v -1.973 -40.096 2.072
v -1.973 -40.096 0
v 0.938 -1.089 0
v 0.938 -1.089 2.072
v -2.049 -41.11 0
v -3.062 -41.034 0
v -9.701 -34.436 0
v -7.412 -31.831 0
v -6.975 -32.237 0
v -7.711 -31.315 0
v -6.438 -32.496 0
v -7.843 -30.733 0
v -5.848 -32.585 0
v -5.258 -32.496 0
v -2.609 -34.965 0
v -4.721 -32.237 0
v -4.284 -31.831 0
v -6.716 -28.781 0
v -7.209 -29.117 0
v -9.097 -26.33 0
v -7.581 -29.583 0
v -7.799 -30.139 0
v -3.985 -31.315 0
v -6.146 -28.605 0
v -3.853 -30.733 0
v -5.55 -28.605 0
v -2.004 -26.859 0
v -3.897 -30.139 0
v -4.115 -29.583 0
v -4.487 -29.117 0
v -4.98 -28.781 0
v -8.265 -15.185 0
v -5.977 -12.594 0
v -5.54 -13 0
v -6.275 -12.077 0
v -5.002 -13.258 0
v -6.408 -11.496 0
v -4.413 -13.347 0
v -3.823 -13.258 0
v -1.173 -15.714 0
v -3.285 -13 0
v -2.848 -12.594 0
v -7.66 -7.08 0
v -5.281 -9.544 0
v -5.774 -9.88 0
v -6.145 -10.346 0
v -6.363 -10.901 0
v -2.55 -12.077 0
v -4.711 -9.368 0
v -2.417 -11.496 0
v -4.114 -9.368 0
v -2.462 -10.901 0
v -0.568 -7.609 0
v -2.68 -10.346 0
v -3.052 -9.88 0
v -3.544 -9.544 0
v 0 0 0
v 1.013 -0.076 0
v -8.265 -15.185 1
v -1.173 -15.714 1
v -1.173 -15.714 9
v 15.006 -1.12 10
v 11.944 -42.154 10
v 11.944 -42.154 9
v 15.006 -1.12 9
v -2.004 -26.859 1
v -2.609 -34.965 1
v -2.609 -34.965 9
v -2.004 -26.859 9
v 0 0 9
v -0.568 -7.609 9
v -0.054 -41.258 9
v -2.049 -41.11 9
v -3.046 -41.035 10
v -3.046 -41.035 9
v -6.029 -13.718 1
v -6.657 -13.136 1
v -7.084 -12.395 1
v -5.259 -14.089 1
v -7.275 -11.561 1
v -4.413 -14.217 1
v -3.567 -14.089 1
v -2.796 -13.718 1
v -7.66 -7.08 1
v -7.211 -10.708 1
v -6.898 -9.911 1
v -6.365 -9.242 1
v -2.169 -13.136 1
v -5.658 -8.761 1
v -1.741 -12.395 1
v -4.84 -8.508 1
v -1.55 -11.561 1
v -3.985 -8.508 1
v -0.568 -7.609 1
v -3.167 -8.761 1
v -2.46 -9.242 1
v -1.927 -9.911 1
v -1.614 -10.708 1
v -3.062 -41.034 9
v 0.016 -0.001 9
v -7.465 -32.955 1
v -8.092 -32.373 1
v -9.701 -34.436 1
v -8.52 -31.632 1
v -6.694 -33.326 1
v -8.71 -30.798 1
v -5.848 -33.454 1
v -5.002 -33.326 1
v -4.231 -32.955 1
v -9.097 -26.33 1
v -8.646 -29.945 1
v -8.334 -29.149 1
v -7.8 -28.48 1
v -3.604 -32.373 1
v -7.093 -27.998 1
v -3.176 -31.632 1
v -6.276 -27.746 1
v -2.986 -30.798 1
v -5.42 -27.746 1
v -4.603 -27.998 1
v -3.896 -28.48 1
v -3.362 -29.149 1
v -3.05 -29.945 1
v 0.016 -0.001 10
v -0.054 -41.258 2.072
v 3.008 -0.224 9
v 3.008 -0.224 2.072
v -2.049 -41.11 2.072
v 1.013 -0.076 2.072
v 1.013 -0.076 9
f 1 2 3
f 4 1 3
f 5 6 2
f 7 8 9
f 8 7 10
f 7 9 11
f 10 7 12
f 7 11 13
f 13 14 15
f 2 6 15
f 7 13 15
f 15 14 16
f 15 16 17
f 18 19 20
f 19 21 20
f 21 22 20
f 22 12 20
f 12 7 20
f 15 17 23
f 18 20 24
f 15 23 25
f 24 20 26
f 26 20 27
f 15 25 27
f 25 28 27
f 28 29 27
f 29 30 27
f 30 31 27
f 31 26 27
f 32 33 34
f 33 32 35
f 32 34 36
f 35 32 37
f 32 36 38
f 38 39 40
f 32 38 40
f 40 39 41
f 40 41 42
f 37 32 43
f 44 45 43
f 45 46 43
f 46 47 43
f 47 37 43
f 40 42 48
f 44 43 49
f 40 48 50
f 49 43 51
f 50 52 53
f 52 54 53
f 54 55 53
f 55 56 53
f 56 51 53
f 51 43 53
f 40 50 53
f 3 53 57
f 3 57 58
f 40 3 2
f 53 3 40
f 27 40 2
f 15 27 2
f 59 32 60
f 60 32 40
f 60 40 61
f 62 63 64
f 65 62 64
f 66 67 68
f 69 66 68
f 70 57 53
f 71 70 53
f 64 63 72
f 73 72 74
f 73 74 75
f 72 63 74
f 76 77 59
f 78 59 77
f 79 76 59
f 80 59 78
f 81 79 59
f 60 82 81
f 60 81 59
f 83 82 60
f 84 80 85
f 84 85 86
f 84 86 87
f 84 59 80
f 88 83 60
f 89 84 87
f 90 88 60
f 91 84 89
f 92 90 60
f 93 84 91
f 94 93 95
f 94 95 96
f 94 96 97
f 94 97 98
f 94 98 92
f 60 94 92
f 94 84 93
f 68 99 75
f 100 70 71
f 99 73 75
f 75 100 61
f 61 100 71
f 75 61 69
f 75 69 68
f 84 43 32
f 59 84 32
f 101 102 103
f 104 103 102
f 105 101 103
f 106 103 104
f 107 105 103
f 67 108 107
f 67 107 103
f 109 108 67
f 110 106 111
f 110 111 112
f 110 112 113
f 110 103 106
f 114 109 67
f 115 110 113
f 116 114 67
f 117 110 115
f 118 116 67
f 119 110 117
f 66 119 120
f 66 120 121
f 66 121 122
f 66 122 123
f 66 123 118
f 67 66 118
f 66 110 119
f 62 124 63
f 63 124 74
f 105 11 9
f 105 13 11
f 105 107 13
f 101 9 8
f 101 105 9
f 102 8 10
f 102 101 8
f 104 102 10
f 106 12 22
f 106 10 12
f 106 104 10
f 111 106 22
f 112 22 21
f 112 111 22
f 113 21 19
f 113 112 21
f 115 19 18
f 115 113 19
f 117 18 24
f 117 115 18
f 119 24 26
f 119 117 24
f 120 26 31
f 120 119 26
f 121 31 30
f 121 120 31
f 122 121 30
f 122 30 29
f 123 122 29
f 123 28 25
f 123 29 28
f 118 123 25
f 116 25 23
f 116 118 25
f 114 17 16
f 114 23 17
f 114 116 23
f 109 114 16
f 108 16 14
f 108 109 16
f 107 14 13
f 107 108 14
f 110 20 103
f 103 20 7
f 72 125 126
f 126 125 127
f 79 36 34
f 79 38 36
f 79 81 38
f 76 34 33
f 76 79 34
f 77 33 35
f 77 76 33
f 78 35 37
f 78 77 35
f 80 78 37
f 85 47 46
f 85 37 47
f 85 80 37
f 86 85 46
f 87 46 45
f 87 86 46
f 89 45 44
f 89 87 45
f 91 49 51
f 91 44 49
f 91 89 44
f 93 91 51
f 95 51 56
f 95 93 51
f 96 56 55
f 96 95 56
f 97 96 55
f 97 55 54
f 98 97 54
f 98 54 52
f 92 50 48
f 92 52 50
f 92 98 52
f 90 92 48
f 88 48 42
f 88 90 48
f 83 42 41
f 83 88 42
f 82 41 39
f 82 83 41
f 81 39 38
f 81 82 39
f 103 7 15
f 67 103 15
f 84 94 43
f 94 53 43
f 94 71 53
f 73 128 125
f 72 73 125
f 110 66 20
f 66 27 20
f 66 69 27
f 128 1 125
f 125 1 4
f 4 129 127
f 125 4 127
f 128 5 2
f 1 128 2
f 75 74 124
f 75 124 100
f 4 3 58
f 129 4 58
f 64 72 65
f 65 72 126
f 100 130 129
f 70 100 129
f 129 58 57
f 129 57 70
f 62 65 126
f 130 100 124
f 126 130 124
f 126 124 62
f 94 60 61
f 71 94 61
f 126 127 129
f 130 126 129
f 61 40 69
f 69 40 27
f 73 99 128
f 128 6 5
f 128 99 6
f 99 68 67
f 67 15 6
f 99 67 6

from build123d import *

# Parameters (mm, degrees)
BOSS_EXTRUDE2_DEPTH                           = 9
CUT_EXTRUDE3_DEPTH                            = 37.794697197
CUT_EXTRUDE3_DEPTH_BACK                       = 29.526
SKETCH3_W                                     = 54.22029704
SKETCH3_H                                     = 8
BOSS_EXTRUDE3_DEPTH                           = 14.032
BOSS_EXTRUDE3_DEPTH_BACK                      = 1
BOSS_EXTRUDE4_DEPTH                           = 2
CSK_FOR_3_FLAT_HEAD_SOCKET_CAP_SCREW1_A_COUNT = 2
CSK_FOR_3_FLAT_HEAD_SOCKET_CAP_SCREW1_A_PITCH = 19.290792


with BuildPart() as part:
    # Sketch2 → Boss-Extrude2 (new body)
    with BuildSketch(Plane.XY):
        Polygon((-9.096510891, -26.330282843), (-9.701316376, -34.435752293), (-2.609093023, -34.964952435), (-3.061940834, -41.033918716), (-2.048641284, -41.109525962), (-1.973042695, -40.096342438), (0.937582862, -1.088781958), (1.013181451, -0.075598434), (0, 0), (-0.567761002, -7.60900747), (-7.660098307, -7.079798826), (-8.264903605, -15.18526578), (-1.1725663, -15.714474425), (-2.004173586, -26.859491487), align=None)
    extrude(amount=BOSS_EXTRUDE2_DEPTH)

    # Sketch3 → Cut-Extrude3 (cut, two sides: drawn at the far end of the back side and taken through both)
    with BuildSketch(Plane(origin=(-2.608979071, -34.964960937, 0), x_dir=(0.9972277257028987, -0.07441010072177218, 0), z_dir=(-0.07441010072177218, -0.9972277257028987, 0)).offset(-CUT_EXTRUDE3_DEPTH_BACK)):
        with Locations((-27.110262789, 5)):
            Rectangle(SKETCH3_W, SKETCH3_H)
    extrude(amount=CUT_EXTRUDE3_DEPTH + CUT_EXTRUDE3_DEPTH_BACK, mode=Mode.SUBTRACT)

    # Sketch4 → Boss-Extrude3 (add, two sides: drawn at the far end of the back side and taken through both)
    with BuildSketch(Plane(origin=(1.013183369, -0.075600662, 0), x_dir=(0, 0, -1), z_dir=(0.9972277257028997, -0.07441010072175744, 0)).offset(-BOSS_EXTRUDE3_DEPTH_BACK)):
        Polygon((-9, -41.147998684), (-9, 2.079e-06), (-10, 0), (-10, -41.147998684), align=None)
    extrude(amount=BOSS_EXTRUDE3_DEPTH + BOSS_EXTRUDE3_DEPTH_BACK)


with BuildPart() as boss_extrude4_tool:
    # Sketch5 → Boss-Extrude4 (new body)
    with BuildSketch(Plane(origin=(1.013183369, -0.075600662, 0), x_dir=(0, 0, -1), z_dir=(0.9972277257028997, -0.07441010072175744, 0))):
        Polygon((-2.072367721, 0), (-9, 2.079e-06), (-9, -41.147998684), (-2.072367721, -41.147998684), align=None)
    extrude(amount=BOSS_EXTRUDE4_DEPTH)


with BuildPart() as part_1:
    add(part.part)


with BuildPart() as part_2:
    # Boss-Extrude4: joined with boss_extrude4_tool
    add(part_1.part.fuse(boss_extrude4_tool.part, tol=0.00001))

    # Sketch6 → CSK for #3 Flat Head Socket Cap Screw1 (revolve, cut)
    with BuildSketch(Plane(origin=(-4.41257913, -11.346475453, 1), x_dir=(0, -1, 0), z_dir=(1, 0, 0))):
        Polygon((0, 0), (0, 1), (1.397, 1), (1.397, 1.694722738), (2.8702, 0), align=None)
    csk_for_3_flat_head_socket_cap_screw1 = revolve(axis=Axis((-4.41257913, -11.346475453, 7.35), (0, 0, -1)), mode=Mode.SUBTRACT)

    # CSK for #3 Flat Head Socket Cap Screw1 a: CSK for #3 Flat Head Socket Cap Screw1 ×2
    with Locations(*[Vector(-0.07441010072177331, -0.9972277257028986, 0) * (i * CSK_FOR_3_FLAT_HEAD_SOCKET_CAP_SCREW1_A_PITCH) for i in range(1, CSK_FOR_3_FLAT_HEAD_SOCKET_CAP_SCREW1_A_COUNT)]):
        add(csk_for_3_flat_head_socket_cap_screw1, mode=Mode.SUBTRACT)


solid = part_2.part
